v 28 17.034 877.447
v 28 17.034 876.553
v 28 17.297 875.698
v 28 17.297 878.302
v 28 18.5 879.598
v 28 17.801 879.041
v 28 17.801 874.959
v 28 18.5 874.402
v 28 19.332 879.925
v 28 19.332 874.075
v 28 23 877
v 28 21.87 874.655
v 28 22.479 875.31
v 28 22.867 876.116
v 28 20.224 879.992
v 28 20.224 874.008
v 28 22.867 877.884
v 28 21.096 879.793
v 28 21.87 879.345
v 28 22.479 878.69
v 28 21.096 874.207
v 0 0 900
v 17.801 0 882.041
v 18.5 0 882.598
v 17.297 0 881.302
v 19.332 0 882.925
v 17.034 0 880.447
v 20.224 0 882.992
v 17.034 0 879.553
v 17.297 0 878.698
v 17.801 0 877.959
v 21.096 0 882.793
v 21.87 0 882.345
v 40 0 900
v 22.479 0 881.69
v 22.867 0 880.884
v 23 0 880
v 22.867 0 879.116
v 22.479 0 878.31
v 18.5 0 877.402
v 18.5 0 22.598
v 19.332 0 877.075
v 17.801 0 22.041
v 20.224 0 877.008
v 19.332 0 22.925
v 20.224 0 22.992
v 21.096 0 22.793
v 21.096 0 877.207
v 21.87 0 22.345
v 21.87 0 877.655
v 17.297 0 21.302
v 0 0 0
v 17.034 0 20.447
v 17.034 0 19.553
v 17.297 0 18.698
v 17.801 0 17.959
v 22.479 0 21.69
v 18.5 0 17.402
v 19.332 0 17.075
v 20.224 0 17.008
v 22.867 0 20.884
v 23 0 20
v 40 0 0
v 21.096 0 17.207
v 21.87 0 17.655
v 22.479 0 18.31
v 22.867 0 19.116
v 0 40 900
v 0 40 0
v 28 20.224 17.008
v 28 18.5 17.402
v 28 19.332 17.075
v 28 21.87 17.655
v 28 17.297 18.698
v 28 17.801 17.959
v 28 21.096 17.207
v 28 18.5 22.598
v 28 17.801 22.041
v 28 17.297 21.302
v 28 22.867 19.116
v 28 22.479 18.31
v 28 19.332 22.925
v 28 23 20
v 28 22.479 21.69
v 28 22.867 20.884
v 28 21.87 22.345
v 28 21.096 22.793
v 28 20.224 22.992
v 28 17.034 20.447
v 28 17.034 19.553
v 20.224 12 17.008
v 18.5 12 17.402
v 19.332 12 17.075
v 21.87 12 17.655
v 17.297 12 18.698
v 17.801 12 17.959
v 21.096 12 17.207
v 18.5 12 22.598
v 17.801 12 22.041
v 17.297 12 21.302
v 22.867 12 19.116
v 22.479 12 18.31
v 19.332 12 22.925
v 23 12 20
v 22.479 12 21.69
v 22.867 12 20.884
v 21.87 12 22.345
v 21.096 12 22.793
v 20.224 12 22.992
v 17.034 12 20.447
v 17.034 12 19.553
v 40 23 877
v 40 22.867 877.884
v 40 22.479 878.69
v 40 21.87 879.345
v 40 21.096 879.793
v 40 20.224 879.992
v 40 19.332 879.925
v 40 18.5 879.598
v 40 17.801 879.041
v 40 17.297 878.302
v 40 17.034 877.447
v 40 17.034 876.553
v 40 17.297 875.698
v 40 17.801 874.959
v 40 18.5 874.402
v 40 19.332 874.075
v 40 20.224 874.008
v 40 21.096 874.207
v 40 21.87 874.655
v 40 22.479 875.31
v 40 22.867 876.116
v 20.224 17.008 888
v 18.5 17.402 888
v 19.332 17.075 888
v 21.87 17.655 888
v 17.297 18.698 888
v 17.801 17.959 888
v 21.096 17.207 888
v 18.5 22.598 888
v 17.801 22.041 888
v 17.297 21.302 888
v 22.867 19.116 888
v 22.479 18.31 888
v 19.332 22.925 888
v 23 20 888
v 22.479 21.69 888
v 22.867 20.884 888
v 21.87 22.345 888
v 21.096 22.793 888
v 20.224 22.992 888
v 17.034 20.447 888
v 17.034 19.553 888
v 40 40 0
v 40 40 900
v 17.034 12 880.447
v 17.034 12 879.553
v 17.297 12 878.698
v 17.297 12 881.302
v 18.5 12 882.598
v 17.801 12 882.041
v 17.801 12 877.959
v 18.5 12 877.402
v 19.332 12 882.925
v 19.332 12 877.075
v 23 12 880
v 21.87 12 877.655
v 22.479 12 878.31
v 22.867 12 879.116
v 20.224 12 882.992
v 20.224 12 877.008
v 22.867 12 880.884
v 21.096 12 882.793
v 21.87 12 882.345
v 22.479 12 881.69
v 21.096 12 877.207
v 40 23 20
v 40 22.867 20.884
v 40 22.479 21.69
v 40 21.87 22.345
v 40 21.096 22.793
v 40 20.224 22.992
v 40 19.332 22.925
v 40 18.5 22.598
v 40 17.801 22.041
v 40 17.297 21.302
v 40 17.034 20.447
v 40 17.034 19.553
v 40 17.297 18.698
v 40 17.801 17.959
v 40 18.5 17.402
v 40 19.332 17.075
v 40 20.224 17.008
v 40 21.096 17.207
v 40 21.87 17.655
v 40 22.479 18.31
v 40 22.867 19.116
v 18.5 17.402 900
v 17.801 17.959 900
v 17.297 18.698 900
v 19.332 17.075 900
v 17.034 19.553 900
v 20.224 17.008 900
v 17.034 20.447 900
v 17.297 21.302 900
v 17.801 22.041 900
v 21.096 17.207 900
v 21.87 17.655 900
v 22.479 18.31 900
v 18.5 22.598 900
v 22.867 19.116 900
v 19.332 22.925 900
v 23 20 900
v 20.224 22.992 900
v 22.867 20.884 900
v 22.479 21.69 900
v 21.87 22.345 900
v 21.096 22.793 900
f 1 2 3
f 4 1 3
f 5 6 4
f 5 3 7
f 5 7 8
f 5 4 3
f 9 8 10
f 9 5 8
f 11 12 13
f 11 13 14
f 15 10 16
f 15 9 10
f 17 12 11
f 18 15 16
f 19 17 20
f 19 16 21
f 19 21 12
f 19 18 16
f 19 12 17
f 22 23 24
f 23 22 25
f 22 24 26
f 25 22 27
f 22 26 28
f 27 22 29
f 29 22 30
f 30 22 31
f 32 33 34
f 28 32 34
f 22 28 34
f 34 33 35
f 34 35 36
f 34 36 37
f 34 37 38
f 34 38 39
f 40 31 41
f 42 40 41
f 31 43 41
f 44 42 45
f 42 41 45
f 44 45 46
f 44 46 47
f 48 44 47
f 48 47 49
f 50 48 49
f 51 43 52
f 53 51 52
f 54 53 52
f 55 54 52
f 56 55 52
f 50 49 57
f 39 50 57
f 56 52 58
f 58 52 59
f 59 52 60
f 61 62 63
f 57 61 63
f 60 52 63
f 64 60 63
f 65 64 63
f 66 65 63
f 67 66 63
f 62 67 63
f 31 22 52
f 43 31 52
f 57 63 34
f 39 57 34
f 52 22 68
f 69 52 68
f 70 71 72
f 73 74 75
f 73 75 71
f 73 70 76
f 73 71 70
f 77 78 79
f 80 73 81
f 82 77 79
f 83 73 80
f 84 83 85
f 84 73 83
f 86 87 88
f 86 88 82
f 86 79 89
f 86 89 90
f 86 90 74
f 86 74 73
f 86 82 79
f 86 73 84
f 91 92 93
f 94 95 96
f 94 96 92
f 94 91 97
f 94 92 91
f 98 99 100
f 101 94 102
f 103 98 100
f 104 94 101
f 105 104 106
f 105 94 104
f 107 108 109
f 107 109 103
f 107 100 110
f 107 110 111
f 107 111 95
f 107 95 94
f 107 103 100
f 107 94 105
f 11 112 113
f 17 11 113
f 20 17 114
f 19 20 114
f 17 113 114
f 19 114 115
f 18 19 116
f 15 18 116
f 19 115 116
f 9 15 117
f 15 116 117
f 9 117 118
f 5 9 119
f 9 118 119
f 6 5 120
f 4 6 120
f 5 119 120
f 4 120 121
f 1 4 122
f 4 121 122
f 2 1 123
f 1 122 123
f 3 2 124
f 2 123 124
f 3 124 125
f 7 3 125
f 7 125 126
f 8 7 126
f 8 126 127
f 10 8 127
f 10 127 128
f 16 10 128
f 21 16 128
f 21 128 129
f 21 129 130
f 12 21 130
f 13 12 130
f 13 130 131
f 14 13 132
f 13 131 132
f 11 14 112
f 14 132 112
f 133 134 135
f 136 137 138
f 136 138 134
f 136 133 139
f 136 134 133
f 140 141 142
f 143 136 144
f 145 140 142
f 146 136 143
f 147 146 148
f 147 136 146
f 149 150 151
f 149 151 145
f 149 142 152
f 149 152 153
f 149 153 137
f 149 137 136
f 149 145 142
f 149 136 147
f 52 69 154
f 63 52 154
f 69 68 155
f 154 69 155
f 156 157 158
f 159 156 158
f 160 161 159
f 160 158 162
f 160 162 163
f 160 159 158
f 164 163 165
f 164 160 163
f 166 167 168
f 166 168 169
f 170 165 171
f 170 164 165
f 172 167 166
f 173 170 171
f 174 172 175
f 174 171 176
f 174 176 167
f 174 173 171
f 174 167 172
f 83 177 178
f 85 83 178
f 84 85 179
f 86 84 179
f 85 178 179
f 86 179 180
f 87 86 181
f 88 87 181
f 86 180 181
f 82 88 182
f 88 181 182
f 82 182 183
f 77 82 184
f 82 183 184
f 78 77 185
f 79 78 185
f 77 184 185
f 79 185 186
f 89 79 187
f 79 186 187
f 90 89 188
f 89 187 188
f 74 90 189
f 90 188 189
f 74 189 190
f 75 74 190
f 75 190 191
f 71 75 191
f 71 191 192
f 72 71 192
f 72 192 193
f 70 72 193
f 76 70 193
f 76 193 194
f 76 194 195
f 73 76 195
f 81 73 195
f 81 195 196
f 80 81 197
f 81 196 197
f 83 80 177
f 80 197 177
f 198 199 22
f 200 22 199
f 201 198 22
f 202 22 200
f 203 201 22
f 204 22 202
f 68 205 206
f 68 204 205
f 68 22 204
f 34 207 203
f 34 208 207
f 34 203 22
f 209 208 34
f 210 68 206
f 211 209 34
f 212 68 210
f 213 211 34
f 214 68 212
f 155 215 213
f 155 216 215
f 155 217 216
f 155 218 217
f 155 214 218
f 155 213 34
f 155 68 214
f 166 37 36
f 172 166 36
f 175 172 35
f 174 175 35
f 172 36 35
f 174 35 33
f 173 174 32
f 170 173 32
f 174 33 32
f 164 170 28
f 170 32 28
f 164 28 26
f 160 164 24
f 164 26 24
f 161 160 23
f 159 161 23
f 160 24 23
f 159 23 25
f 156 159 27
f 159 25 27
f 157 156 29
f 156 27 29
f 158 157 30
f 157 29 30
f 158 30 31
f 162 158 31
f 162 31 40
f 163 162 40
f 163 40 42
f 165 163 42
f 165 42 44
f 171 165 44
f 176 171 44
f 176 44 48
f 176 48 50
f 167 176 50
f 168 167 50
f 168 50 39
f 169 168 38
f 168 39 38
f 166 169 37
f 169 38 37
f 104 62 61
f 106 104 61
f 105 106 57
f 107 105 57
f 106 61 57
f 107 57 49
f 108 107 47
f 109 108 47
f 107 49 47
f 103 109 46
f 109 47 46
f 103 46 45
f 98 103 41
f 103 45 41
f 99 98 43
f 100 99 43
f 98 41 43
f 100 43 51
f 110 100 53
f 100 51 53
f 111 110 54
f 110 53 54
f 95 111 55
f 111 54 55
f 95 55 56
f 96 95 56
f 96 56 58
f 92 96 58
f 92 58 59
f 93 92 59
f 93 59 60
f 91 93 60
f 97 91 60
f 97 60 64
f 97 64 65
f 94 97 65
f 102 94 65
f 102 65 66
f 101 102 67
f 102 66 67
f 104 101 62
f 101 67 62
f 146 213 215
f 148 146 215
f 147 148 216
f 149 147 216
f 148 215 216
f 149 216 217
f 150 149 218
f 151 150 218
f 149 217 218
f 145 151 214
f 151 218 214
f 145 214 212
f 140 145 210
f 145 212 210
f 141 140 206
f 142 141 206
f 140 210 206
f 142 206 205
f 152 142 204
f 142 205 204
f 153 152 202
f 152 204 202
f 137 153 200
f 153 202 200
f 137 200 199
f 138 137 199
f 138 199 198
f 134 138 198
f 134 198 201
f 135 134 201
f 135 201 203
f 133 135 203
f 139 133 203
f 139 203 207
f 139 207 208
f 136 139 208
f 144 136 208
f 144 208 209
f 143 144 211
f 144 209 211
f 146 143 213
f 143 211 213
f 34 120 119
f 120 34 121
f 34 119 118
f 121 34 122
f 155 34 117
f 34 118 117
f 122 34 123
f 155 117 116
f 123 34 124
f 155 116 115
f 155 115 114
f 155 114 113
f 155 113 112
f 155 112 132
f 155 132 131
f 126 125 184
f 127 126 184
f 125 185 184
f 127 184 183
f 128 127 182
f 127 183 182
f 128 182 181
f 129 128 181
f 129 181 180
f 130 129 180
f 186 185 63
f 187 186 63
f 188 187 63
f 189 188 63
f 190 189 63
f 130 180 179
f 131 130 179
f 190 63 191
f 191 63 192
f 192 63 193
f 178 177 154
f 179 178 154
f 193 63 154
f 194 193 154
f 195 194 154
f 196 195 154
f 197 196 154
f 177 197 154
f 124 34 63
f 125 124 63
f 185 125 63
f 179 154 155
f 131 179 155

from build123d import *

# Parameters (mm, degrees)
F0_W      = 40
F0_H      = 40
F1_DEPTH  = 900
F2_R      = 3
F3_DEPTH  = 12
F4_R      = 3
F5_DEPTH  = 12
F6_R      = 3
F7_DEPTH  = 12
F8_R      = 3
F9_DEPTH  = 12
F10_R     = 3
F11_DEPTH = 12


with BuildPart() as f1:
    # F0 (on Top) → F1 (new body)
    with BuildSketch(Plane.XY):
        with Locations((20, 20)):
            Rectangle(F0_W, F0_H)
    extrude(amount=F1_DEPTH)

    # F2 (on face) → F3 (cut)
    with BuildSketch(Plane.XY.offset(900)):
        with Locations((20, 20)):
            Circle(F2_R)
    extrude(amount=-F3_DEPTH, mode=Mode.SUBTRACT)

    # F4 (on face) → F5 (cut)
    with BuildSketch(Plane.XZ):
        with Locations((20, 880)):
            Circle(F4_R)
    extrude(amount=-F5_DEPTH, mode=Mode.SUBTRACT)

    # F6 (on face) → F7 (cut)
    with BuildSketch(Plane.YZ.offset(40)):
        with Locations((20, 877)):
            Circle(F6_R)
    extrude(amount=-F7_DEPTH, mode=Mode.SUBTRACT)

    # F8 (on face) → F9 (cut)
    with BuildSketch(Plane.YZ.offset(40)):
        with Locations((20, 20)):
            Circle(F8_R)
    extrude(amount=-F9_DEPTH, mode=Mode.SUBTRACT)

    # F10 (on face) → F11 (cut)
    with BuildSketch(Plane.XZ):
        with Locations((20, 20)):
            Circle(F10_R)
    extrude(amount=-F11_DEPTH, mode=Mode.SUBTRACT)


solid = f1.part
